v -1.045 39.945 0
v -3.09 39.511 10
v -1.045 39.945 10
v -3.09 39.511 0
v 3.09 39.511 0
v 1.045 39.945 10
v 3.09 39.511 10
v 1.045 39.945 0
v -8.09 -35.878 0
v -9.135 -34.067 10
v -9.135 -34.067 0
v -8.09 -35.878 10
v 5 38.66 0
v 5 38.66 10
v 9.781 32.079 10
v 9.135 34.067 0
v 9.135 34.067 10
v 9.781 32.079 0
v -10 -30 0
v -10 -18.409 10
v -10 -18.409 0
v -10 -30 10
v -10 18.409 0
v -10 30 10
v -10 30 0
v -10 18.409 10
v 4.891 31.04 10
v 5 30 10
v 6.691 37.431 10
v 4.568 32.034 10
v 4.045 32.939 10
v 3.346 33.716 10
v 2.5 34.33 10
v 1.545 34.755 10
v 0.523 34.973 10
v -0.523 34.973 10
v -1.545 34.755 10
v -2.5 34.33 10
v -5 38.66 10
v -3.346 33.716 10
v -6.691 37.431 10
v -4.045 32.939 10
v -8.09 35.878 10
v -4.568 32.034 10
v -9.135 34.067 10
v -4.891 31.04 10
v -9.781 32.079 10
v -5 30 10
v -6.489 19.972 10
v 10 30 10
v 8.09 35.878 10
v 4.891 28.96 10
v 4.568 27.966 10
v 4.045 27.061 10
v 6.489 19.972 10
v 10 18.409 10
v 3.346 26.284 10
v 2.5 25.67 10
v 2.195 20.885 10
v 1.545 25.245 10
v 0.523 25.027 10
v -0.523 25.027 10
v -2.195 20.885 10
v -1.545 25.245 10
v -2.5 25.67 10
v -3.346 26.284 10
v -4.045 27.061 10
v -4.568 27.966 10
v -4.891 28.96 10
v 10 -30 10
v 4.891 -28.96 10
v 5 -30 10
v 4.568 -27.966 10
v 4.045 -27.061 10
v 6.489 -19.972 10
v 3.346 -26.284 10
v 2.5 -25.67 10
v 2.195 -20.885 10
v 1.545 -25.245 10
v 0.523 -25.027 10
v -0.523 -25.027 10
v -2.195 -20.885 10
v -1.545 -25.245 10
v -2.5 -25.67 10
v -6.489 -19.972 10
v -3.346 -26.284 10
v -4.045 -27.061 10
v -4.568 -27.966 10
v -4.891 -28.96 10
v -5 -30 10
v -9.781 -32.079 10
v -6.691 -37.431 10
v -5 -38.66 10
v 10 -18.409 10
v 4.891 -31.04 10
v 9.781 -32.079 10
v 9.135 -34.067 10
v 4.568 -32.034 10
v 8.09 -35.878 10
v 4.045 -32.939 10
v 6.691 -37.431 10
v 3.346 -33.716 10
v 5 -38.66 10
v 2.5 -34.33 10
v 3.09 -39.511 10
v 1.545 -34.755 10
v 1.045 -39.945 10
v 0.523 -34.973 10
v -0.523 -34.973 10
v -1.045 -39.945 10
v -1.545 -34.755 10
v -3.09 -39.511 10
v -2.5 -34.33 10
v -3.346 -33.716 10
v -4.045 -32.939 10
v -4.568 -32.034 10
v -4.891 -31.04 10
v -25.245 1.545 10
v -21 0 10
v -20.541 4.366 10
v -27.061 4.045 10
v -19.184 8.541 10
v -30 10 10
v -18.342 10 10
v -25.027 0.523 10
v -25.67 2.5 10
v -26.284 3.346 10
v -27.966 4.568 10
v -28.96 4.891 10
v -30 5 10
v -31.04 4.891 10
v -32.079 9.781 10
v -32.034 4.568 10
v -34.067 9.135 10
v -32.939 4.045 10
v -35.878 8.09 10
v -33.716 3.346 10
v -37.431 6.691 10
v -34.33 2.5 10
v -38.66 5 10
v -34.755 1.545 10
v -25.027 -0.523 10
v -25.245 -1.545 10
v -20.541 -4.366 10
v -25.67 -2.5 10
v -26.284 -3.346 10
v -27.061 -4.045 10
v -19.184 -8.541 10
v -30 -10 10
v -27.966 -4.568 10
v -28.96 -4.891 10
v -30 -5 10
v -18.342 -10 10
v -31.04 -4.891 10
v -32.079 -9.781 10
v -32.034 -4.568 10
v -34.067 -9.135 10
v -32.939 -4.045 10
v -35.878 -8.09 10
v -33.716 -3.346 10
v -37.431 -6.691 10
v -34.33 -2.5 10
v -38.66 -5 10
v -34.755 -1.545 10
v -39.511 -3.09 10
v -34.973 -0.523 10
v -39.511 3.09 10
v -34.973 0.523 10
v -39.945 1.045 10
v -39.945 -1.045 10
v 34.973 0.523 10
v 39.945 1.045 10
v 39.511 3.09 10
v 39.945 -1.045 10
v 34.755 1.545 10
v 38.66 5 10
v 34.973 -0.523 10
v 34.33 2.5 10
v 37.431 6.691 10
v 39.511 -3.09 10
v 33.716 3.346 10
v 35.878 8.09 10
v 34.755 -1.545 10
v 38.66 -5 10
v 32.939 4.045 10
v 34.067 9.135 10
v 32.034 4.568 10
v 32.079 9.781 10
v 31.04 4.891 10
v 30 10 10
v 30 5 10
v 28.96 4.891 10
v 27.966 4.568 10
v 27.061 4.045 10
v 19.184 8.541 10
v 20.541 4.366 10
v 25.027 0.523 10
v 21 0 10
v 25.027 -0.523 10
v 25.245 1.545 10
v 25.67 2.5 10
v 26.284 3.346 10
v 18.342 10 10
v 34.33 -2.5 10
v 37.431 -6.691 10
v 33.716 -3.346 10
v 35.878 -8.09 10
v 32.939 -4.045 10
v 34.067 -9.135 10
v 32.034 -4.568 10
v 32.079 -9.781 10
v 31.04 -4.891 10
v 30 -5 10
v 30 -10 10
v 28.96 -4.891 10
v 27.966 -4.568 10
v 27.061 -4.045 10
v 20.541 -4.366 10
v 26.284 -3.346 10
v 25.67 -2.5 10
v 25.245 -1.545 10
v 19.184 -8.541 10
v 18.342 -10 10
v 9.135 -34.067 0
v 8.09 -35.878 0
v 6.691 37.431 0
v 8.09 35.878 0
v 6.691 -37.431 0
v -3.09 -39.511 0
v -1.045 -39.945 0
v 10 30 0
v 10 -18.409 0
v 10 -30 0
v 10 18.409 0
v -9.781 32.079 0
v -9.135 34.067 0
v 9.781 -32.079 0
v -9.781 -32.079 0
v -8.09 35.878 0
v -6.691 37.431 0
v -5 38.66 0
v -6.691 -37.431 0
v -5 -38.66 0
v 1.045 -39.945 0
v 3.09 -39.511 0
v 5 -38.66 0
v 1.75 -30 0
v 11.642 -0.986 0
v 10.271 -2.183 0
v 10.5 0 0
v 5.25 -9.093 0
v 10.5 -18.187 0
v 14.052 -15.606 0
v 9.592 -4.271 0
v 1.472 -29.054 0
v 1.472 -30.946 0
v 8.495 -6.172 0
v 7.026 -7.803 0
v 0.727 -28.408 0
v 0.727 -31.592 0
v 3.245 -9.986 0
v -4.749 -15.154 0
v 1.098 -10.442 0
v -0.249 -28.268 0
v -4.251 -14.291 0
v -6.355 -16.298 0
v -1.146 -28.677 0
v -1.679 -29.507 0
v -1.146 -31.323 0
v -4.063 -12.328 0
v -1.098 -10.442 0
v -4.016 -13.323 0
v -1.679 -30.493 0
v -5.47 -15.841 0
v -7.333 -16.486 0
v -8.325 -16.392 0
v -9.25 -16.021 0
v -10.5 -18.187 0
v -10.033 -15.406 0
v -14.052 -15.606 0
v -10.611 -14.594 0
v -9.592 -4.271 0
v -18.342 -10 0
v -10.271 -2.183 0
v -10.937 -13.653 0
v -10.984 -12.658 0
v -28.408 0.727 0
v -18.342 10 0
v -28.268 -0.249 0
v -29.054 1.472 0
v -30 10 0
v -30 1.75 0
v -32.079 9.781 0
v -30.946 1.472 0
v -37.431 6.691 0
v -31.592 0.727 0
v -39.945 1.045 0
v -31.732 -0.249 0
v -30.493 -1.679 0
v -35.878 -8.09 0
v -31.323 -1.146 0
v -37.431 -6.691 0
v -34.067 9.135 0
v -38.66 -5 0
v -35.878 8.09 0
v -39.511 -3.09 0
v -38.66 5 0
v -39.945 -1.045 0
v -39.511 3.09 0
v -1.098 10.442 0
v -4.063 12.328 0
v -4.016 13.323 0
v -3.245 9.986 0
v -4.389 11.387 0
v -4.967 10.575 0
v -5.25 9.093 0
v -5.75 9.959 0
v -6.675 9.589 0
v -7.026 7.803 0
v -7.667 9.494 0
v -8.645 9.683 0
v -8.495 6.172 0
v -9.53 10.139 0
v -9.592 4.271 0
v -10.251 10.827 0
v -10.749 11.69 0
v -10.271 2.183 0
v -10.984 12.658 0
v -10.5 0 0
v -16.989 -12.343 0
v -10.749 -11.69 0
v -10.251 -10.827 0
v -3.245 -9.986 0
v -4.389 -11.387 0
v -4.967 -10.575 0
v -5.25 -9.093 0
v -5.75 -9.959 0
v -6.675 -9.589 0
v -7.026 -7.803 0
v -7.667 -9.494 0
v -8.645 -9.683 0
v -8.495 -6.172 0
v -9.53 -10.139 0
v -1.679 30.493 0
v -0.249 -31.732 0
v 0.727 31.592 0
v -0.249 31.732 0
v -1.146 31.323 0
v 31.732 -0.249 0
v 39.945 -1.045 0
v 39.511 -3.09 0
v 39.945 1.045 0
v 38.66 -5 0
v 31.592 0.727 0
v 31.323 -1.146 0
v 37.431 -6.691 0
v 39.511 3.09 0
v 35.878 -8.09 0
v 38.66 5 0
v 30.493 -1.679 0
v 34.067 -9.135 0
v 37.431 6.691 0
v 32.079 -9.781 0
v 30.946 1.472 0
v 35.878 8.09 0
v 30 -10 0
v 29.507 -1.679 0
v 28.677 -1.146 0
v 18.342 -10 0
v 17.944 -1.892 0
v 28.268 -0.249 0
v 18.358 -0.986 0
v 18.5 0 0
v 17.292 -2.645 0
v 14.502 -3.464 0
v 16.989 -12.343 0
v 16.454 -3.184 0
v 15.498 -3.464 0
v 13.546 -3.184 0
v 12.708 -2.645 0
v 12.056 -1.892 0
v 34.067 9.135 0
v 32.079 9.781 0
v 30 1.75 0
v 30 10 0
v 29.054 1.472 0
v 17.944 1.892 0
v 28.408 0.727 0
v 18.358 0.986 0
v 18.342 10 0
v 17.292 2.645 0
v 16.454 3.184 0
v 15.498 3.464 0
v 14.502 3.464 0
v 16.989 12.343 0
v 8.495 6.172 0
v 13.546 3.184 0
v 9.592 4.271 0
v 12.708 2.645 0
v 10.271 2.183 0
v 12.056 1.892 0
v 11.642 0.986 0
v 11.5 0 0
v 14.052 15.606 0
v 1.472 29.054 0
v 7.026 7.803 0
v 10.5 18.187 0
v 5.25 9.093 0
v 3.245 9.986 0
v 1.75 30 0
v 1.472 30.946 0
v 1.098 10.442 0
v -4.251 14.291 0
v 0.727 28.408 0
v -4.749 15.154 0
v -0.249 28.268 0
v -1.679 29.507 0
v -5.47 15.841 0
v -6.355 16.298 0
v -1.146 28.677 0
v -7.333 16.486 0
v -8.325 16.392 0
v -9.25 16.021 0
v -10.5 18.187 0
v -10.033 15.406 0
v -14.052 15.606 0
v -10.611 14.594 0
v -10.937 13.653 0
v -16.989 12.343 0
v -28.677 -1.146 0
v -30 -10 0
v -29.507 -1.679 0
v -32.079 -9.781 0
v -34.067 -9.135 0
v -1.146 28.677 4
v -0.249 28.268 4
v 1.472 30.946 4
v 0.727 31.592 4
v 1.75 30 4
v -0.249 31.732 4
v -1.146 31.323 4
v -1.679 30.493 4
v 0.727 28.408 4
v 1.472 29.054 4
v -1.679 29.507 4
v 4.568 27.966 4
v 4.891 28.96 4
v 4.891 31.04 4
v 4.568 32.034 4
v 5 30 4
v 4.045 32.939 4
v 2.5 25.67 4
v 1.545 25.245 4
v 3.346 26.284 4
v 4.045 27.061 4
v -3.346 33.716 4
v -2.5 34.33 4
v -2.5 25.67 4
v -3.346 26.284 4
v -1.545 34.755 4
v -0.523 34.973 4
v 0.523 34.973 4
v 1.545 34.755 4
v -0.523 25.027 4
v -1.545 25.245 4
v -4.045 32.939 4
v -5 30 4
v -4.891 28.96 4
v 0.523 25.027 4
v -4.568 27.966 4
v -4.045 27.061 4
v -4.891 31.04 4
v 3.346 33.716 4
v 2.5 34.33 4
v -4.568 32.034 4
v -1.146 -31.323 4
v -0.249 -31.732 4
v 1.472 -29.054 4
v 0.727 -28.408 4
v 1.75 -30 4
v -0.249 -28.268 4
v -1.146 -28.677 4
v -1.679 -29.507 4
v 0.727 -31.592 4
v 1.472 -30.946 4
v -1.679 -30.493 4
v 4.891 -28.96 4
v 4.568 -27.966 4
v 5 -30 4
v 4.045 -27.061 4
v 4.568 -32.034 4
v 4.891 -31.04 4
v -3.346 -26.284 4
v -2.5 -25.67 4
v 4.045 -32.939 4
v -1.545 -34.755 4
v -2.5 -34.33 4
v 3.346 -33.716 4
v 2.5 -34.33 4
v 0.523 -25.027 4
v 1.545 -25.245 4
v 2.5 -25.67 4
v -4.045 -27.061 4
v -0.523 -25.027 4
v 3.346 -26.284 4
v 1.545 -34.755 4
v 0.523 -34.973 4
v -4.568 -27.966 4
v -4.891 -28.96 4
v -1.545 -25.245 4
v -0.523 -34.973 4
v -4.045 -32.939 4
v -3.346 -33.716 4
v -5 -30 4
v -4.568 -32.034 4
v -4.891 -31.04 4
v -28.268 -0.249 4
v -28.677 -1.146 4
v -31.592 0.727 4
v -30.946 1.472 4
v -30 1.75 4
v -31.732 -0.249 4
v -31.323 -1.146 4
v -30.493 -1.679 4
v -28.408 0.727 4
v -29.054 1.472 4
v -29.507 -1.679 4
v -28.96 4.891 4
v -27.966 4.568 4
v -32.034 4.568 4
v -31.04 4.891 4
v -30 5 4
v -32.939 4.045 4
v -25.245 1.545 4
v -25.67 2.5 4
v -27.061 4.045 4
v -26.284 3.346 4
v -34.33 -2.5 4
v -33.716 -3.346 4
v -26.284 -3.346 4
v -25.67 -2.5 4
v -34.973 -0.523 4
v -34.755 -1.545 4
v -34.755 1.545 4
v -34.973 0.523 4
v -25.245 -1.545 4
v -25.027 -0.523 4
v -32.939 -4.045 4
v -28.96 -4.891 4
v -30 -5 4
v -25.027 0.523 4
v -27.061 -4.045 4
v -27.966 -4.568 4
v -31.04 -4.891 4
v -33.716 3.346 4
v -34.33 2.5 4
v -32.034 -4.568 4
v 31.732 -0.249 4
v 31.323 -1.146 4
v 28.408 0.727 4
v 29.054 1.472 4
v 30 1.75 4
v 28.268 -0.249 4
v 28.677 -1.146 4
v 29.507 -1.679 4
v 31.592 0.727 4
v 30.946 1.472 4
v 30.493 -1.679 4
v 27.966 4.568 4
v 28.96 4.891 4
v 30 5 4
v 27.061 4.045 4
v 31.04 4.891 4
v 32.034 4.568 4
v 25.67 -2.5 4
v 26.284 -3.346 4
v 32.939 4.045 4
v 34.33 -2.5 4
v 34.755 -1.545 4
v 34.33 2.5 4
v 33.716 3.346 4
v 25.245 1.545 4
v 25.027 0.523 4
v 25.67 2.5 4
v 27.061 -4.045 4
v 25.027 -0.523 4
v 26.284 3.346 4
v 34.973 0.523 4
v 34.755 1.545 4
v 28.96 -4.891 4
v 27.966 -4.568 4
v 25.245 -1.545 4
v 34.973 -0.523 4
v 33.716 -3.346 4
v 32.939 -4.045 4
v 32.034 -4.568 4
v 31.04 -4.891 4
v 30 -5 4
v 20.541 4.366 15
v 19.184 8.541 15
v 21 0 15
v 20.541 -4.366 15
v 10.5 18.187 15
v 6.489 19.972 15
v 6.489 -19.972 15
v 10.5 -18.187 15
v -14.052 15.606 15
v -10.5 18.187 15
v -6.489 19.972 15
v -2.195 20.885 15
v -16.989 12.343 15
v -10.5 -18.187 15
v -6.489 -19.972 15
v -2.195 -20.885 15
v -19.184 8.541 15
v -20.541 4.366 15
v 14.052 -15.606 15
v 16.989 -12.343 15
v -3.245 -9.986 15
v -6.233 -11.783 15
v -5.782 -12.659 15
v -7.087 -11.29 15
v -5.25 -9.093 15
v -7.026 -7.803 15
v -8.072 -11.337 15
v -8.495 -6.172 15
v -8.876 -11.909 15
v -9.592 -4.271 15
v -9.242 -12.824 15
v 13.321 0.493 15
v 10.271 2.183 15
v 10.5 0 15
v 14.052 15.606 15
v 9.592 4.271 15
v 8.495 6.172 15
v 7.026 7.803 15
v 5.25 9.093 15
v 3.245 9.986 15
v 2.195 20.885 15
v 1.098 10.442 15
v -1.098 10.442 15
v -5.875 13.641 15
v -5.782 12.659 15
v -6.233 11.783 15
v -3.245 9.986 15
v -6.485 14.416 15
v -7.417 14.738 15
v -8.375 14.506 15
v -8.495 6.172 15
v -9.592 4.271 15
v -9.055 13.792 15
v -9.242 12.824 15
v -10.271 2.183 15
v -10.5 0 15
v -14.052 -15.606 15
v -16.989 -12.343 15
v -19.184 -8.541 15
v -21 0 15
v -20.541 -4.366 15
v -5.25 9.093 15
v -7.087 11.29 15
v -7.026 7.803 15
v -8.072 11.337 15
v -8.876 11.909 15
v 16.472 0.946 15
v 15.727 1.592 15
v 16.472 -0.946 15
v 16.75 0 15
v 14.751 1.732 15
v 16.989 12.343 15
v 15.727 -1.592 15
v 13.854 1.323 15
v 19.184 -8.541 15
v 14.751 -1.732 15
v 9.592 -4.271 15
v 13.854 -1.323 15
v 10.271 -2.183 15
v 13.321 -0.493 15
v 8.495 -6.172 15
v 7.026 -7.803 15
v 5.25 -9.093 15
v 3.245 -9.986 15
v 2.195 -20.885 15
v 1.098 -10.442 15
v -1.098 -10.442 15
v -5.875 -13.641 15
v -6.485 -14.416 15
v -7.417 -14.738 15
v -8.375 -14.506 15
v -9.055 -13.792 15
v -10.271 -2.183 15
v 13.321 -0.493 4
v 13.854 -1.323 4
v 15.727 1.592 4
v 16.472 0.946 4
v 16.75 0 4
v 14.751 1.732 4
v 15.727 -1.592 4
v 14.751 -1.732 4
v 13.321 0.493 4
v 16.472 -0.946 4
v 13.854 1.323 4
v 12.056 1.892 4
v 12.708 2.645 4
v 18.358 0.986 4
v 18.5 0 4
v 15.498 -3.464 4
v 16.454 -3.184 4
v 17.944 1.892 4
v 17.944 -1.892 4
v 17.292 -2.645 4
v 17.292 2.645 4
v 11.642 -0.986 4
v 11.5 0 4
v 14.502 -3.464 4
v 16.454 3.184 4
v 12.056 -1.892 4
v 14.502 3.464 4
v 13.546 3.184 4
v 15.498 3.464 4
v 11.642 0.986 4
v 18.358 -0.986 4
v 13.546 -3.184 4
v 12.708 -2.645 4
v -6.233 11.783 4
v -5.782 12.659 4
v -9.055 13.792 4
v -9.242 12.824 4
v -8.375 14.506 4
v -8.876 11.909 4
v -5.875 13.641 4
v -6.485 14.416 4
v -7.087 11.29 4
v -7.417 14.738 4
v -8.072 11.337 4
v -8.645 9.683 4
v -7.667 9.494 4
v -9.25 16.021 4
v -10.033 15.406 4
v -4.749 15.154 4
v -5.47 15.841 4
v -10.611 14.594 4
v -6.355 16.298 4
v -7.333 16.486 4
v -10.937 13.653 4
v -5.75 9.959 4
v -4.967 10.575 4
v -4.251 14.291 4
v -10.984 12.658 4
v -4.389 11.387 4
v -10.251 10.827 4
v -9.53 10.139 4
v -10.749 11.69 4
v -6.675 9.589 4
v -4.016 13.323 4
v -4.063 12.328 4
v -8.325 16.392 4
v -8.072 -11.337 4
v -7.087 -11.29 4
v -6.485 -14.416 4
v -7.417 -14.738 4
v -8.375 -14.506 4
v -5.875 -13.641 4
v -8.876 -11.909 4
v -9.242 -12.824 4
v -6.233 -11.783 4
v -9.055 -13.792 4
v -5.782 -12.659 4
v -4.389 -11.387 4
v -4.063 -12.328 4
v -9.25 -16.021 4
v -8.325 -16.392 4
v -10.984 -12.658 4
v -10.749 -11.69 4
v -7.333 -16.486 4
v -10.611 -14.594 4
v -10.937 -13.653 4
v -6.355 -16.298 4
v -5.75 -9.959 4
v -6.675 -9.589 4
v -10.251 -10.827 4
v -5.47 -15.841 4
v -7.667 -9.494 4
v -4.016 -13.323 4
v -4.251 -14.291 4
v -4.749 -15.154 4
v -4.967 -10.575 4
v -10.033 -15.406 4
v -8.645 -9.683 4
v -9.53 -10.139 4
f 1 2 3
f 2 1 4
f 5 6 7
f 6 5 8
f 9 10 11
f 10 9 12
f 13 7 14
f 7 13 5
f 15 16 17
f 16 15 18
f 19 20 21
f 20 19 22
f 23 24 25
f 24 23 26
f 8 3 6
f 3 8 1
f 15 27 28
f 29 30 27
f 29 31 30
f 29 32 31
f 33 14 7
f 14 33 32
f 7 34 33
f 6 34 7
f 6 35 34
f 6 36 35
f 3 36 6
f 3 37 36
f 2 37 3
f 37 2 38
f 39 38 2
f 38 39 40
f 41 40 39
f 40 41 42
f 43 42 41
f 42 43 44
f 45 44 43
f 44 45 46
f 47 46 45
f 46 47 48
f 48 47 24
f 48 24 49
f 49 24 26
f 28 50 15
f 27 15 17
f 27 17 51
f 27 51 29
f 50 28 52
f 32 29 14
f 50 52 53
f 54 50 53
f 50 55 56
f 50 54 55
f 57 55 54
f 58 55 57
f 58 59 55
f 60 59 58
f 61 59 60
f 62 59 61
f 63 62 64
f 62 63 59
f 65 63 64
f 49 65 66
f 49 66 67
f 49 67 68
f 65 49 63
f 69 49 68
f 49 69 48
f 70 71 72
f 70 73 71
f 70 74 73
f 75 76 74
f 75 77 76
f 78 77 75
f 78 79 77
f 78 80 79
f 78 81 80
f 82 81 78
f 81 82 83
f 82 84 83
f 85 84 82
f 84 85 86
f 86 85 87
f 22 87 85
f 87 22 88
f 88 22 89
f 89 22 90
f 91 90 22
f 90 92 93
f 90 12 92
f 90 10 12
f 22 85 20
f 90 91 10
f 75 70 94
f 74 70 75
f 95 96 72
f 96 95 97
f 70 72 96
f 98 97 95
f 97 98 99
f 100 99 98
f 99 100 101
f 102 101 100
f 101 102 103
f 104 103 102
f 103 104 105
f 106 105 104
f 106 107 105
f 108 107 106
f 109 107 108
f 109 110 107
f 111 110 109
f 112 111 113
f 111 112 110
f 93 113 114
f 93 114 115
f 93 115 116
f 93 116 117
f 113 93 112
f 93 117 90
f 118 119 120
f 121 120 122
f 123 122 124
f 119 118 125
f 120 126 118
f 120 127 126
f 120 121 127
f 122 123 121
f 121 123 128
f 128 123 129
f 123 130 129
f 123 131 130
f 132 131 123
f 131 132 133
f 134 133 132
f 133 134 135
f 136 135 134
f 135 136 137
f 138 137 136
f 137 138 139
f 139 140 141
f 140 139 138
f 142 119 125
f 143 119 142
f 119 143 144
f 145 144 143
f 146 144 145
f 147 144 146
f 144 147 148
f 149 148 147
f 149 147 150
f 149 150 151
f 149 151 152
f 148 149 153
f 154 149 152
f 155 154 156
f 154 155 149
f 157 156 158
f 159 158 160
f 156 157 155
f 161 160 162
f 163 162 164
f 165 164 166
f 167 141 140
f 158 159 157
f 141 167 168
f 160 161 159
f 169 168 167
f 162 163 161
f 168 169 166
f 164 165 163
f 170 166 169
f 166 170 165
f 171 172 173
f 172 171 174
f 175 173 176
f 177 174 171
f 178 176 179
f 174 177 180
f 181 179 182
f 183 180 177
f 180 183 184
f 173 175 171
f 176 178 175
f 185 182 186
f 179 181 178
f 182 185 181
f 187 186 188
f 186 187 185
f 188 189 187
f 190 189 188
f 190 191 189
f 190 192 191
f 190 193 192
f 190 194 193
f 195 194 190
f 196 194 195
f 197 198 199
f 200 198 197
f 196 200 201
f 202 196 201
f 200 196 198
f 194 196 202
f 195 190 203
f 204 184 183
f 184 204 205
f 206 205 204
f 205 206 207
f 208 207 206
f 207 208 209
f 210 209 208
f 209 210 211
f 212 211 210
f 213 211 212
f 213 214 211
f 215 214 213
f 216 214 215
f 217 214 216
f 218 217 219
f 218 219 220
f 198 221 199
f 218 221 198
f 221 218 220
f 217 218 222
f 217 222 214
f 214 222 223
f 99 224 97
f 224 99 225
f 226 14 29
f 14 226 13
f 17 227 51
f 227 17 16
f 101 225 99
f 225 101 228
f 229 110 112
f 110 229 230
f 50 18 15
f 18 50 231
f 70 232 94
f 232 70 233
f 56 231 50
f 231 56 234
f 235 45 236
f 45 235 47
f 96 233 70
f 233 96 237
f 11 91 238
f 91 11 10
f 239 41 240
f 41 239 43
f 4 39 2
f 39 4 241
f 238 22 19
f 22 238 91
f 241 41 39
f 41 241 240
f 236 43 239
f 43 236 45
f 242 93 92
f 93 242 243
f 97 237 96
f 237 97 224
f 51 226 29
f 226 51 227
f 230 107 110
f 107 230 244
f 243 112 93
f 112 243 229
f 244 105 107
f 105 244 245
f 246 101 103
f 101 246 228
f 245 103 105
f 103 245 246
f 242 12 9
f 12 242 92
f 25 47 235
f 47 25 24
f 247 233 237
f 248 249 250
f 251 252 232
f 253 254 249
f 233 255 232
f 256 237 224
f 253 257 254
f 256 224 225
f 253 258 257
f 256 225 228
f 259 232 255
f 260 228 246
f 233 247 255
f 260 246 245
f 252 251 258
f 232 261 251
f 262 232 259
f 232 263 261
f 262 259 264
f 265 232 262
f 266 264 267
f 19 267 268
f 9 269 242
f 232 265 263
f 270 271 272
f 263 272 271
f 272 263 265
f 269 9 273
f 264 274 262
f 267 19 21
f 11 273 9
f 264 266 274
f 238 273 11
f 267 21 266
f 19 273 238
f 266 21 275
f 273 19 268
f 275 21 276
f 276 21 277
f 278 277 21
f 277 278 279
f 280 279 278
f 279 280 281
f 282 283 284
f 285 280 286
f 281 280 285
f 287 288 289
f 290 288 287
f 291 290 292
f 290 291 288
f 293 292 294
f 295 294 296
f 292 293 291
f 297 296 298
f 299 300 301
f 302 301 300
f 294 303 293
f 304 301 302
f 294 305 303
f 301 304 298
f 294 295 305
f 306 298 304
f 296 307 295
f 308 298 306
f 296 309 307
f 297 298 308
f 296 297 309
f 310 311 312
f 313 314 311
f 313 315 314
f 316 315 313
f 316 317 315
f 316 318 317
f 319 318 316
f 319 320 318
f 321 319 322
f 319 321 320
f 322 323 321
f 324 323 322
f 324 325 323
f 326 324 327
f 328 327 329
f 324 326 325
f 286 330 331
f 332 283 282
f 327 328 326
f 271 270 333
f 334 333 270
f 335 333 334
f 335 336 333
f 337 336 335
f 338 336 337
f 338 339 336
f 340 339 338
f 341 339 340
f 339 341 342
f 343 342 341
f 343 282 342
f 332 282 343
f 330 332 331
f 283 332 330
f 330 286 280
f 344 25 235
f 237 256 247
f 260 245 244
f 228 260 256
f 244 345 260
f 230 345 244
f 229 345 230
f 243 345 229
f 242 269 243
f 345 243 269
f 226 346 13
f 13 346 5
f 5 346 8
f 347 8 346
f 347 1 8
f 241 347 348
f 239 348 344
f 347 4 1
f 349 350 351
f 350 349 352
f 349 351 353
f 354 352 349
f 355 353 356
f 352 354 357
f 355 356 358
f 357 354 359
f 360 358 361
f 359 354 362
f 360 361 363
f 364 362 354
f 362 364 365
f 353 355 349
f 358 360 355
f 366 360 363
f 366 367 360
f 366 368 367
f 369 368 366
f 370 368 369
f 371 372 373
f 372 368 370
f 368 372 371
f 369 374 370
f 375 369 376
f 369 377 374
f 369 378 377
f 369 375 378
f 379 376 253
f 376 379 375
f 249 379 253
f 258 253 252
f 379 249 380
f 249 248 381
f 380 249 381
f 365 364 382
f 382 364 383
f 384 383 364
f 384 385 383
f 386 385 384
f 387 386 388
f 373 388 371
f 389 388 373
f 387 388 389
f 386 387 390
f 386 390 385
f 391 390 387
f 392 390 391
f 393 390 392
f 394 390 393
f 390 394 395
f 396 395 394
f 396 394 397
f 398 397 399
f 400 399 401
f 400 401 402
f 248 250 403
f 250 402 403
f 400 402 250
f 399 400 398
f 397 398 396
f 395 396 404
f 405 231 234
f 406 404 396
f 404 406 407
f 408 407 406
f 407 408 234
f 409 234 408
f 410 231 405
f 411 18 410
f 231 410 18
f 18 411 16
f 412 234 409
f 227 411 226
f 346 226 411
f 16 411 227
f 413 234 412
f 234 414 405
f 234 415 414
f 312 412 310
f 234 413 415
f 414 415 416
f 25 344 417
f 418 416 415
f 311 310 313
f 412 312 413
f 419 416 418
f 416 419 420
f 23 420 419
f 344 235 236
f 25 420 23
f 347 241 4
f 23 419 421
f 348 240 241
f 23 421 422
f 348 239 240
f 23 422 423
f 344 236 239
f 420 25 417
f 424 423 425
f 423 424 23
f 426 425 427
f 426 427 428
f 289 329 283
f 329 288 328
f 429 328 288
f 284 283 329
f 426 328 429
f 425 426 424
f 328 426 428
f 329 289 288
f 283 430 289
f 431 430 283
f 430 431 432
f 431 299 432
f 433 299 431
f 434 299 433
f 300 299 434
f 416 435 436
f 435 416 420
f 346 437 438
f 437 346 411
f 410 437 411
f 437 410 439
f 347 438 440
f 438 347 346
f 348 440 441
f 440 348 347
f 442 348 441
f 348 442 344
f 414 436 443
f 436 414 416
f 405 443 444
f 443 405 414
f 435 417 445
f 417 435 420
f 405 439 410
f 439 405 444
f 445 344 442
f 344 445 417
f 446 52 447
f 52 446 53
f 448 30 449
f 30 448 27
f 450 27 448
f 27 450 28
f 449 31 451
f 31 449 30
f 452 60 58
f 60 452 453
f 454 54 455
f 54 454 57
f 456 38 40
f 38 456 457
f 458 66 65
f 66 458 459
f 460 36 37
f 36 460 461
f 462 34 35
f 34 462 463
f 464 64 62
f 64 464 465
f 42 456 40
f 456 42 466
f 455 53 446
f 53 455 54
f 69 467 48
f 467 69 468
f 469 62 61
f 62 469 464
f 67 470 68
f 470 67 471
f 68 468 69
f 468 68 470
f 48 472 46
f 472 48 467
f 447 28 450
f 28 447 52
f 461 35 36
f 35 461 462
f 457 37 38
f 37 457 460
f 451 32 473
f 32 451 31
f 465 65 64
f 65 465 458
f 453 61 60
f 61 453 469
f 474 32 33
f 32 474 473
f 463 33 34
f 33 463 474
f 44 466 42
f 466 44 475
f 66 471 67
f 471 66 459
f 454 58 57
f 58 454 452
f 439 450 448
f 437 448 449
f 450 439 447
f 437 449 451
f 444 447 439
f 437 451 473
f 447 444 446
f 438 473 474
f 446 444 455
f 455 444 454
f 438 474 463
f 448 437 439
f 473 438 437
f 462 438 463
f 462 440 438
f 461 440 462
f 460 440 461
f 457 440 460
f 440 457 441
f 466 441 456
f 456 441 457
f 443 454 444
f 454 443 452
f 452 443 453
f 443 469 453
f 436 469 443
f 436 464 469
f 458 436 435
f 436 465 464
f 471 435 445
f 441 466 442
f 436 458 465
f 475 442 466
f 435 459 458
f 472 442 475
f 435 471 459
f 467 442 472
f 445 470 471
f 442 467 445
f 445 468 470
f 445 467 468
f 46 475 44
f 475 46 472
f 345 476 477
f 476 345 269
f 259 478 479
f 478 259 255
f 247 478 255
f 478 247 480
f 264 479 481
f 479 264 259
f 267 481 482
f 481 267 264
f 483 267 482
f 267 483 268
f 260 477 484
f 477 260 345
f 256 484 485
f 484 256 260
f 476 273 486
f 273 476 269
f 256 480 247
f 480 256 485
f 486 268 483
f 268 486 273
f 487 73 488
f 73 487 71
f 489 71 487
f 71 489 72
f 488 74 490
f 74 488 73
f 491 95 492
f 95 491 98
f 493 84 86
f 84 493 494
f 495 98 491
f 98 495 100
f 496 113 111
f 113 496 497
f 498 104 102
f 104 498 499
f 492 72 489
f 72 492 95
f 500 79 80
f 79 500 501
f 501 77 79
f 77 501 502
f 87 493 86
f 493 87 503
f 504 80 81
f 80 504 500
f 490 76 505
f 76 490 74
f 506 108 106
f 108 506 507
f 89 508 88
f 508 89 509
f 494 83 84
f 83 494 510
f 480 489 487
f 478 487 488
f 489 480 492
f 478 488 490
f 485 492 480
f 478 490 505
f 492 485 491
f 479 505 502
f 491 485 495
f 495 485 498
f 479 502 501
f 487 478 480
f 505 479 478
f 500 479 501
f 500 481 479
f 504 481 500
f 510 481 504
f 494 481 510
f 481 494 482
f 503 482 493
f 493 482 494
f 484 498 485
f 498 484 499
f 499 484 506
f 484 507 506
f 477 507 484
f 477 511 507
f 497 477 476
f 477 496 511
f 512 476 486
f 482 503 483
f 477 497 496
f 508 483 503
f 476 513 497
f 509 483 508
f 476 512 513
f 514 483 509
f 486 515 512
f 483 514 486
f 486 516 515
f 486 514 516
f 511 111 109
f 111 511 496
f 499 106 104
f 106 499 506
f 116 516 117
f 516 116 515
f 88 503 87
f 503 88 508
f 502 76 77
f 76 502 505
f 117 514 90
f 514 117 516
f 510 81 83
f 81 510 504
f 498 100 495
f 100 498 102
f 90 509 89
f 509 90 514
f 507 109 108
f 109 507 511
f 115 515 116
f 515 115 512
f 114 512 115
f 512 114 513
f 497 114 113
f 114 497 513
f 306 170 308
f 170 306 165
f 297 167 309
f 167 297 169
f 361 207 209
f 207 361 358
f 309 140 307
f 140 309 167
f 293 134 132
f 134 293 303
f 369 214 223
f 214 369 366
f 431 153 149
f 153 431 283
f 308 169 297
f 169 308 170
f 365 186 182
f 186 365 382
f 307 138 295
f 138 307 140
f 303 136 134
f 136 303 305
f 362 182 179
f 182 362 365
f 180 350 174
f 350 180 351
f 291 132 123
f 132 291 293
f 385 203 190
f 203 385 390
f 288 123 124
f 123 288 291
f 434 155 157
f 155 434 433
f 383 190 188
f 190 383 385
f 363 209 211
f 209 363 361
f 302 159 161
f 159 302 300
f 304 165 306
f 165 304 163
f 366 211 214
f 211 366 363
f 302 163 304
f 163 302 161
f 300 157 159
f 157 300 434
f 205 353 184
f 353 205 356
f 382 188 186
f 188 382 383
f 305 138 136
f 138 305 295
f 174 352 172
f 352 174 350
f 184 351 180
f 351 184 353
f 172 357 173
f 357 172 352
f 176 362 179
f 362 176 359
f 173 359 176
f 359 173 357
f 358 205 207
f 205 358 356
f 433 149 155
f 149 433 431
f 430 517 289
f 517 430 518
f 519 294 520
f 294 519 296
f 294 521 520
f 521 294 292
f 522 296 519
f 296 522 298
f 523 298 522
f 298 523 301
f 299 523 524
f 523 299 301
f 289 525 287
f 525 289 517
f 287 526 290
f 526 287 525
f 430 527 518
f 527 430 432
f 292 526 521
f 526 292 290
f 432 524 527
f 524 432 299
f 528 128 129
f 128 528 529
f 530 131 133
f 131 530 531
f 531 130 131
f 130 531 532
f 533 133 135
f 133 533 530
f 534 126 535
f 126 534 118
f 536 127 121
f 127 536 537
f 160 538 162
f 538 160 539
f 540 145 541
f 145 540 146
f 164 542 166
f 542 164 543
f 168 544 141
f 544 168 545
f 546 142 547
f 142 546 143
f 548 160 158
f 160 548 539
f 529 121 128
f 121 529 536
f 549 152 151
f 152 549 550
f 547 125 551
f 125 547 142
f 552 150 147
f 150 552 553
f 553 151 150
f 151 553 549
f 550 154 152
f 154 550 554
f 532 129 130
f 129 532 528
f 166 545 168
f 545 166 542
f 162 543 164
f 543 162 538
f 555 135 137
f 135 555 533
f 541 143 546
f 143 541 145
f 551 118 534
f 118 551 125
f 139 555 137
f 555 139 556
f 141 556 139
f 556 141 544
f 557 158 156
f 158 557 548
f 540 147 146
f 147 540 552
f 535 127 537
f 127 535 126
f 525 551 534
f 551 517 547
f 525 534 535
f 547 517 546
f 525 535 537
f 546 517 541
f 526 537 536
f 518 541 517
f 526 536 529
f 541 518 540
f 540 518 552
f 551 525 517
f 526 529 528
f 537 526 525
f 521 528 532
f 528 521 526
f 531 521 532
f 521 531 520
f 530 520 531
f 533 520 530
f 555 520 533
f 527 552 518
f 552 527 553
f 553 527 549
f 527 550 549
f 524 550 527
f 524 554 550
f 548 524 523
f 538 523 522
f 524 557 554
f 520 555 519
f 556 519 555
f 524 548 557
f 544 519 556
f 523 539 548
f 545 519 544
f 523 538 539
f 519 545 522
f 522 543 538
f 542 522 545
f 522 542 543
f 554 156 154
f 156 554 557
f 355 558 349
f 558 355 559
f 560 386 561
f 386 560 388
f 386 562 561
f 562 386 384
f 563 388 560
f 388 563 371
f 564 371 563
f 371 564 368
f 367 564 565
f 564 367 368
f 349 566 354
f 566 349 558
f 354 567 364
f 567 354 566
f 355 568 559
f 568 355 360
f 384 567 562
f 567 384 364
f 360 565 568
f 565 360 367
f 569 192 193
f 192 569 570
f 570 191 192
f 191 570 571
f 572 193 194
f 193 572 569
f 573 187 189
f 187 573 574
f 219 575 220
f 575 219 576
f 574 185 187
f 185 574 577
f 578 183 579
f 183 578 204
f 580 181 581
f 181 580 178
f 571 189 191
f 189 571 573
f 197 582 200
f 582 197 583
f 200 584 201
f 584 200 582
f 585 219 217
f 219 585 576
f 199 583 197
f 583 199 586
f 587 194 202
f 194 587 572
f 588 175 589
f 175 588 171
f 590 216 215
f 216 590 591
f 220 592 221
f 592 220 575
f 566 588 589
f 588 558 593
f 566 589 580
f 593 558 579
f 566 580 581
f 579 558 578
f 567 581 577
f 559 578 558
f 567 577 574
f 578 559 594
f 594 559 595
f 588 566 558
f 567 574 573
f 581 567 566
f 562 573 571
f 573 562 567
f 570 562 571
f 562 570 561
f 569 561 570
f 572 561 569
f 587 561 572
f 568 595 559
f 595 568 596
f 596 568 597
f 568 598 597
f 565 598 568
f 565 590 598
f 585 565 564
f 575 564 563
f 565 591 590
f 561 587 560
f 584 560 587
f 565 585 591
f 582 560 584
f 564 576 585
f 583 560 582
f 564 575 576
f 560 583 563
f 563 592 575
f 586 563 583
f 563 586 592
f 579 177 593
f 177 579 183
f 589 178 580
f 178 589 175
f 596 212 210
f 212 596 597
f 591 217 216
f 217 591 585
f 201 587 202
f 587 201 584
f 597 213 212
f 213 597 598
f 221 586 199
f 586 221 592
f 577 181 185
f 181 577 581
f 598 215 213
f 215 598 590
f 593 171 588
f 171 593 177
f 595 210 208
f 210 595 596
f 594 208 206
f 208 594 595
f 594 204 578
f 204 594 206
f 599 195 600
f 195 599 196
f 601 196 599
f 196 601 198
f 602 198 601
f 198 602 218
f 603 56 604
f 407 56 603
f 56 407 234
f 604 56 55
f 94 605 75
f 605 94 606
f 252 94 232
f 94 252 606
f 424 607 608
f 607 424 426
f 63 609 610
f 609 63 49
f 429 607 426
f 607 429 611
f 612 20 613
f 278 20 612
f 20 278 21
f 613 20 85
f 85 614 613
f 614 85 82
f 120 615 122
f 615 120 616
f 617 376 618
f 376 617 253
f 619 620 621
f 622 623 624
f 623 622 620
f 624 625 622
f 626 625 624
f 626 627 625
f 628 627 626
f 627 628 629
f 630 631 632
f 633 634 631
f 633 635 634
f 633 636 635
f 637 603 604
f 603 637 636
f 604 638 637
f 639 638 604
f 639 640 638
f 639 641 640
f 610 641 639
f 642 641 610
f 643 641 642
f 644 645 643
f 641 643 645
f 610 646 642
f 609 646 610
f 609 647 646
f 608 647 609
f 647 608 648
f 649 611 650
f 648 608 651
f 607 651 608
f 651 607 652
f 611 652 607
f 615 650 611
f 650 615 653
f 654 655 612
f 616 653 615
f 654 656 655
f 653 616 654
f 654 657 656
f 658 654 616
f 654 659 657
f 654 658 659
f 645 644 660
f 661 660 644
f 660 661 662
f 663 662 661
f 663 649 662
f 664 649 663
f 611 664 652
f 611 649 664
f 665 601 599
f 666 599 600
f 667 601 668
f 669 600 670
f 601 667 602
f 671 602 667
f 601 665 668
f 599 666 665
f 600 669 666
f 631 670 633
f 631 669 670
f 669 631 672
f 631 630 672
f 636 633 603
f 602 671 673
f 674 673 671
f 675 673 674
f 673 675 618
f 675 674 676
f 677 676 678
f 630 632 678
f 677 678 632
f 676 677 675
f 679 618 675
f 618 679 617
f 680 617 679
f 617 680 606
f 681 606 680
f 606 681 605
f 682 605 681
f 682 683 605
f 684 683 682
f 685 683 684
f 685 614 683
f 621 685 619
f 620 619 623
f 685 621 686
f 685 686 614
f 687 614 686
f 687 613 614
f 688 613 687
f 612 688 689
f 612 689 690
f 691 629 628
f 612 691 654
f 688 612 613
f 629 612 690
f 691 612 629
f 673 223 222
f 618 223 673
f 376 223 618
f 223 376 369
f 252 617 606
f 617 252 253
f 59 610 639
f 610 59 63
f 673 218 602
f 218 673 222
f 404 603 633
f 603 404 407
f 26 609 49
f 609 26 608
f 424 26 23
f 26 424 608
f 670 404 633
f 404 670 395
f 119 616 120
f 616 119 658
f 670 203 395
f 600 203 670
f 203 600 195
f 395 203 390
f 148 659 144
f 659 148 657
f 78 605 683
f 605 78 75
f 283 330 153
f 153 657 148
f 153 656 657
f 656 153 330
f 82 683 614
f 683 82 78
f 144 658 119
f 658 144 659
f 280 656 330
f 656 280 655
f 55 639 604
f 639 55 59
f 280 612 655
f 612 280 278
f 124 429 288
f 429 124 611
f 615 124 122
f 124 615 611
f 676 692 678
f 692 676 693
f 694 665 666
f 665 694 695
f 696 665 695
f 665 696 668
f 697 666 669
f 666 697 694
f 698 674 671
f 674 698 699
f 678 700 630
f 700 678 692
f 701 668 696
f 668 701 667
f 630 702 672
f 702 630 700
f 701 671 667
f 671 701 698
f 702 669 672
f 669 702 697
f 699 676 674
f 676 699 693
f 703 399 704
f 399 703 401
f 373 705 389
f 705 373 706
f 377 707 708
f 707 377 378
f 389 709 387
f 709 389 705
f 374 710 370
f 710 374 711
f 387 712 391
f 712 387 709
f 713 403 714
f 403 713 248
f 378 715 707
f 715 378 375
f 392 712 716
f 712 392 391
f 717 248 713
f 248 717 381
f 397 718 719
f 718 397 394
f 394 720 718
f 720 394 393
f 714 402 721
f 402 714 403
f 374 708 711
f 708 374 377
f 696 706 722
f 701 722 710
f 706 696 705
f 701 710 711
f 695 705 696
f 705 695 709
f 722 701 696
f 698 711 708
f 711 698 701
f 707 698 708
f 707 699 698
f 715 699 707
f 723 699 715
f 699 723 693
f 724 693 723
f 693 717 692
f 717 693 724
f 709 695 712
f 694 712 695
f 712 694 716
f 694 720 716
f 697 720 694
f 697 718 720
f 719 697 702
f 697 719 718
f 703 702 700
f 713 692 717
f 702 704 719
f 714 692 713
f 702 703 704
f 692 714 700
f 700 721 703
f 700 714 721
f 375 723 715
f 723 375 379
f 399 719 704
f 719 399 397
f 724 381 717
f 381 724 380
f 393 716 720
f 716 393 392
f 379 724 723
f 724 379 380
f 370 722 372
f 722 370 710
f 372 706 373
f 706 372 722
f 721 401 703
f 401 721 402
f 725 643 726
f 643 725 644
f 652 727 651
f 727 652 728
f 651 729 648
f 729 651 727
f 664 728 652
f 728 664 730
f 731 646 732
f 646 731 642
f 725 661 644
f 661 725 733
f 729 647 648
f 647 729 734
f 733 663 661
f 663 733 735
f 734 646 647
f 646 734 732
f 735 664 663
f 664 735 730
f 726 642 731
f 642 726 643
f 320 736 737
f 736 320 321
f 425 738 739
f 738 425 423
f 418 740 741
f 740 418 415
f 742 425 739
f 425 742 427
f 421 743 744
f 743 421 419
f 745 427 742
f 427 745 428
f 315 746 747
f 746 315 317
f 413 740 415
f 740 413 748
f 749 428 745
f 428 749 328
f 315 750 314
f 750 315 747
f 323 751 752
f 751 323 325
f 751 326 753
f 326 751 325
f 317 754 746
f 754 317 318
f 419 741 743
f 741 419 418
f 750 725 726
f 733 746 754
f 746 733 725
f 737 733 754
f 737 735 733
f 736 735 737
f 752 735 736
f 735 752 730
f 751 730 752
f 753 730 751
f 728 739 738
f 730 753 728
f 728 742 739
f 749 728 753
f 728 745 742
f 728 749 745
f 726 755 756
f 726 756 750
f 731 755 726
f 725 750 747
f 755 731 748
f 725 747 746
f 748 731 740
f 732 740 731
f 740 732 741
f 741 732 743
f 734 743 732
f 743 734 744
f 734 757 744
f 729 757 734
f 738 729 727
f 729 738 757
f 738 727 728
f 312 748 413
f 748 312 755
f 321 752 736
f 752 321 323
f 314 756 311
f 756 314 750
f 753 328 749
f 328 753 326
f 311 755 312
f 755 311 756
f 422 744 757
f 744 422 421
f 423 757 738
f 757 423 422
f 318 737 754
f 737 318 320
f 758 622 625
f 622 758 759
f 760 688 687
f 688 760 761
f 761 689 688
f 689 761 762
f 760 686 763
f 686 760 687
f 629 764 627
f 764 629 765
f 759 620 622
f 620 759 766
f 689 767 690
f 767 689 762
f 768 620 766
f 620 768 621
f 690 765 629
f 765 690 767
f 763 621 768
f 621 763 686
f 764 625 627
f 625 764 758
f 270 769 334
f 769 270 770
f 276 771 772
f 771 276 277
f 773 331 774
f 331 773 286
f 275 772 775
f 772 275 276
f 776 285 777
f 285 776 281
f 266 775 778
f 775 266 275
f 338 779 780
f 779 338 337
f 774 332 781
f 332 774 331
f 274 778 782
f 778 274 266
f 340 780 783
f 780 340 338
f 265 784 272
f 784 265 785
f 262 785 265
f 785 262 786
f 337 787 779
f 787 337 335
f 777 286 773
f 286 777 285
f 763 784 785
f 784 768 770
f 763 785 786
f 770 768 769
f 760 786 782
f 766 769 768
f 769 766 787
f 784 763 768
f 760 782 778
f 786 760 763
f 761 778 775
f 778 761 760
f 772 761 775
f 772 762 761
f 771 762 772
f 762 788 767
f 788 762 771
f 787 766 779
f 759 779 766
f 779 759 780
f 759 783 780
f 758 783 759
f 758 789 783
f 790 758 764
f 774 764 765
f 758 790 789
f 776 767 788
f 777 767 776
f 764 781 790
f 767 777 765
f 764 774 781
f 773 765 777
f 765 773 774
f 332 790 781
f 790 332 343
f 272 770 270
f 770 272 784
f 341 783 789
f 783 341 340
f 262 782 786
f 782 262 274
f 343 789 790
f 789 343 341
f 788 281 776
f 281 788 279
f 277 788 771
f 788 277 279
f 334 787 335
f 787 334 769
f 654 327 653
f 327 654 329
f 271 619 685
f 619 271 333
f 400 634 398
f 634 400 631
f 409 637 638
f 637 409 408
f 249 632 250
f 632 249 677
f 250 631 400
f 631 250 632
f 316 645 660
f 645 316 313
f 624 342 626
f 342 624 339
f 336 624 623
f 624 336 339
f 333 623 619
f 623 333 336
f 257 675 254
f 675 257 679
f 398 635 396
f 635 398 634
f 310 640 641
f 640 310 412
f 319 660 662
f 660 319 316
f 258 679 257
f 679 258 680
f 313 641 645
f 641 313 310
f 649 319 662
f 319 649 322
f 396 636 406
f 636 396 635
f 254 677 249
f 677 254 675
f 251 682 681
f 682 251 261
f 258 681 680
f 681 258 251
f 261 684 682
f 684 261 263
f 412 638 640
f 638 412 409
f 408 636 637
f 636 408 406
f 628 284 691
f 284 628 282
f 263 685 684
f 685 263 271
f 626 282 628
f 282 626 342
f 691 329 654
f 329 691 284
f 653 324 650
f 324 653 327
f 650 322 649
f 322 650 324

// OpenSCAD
/**
 * NEMA23 quadrature mount.
 *
 * This catches the screw holes on the back of the NEMA23 motor using
 * long M3x30 screws and allows the quadrature encoder to be screwed
 * in with three M3x10 ones.
 */
plate_thick = 15;
plate_side = 60;
$fs = 1;


module cross(thick)
{
for(i=[0,90])
{
	rotate(i)
	render() difference()
	{
		hull() {
			translate([0,+30,0])
			cylinder(r=10, h=thick);

			translate([0,-30,0])
			cylinder(r=10, h=thick);
		}

		translate([0,+30,-1]) cylinder(r=3.5/2, h=thick+2);
		translate([0,+30,4]) cylinder(r=10/2, h=thick+2);

		translate([0,-30,-1]) cylinder(r=3.5/2, h=thick+2);
		translate([0,-30,4]) cylinder(r=10/2, h=thick+2);
	}
}
}



render() difference()
{
	union()
	{
		cylinder(r=21, h=plate_thick);
		cross(10);
	}

	translate([0,0,-1]) cylinder(r=21/2, h=plate_thick+2);

	for(i=[0:2])
	{
		rotate(i*120) translate([15,0,-1]) {
			cylinder(r=3.5/2, h=plate_thick+2);
			cylinder(r=7/2, h=5);
		}
	}
}


//cross();

/*
translate([0,0,plate_thick/2])
cube([plate_side,plate_side,plate_thick], center=true);



render() difference()
{
	translate([0,0,plate_thick/2]) cube([plate_side,plate_side,plate_thick], center=true);
	translate([0,0,-1]) cylinder(d=20, h=plate_thick+2);

	for(i=[0:2])
	{
		rotate(i*120) translate([15,0,-1]) cylinder(d=3, h=plate_thick+2);
	}
}

module filet(r,h)
{
render() difference()
{
translate([0,0,h/2]) cube([r,r,h], center=true);
translate([r/2,r/2,0]) cylinder(d=r, h=h);
}
}

for(i=[0:3])
{
	rotate(i*90)
	translate([(plate_side-10)/2,(plate_side-10)/2,0])
	{
		difference()
		{
			translate([0,0,40/2]) cube([10,10,40], center=true);
			translate([-10/2,-10/2,0]) filet(10,50);
		}
	}
}
*/
